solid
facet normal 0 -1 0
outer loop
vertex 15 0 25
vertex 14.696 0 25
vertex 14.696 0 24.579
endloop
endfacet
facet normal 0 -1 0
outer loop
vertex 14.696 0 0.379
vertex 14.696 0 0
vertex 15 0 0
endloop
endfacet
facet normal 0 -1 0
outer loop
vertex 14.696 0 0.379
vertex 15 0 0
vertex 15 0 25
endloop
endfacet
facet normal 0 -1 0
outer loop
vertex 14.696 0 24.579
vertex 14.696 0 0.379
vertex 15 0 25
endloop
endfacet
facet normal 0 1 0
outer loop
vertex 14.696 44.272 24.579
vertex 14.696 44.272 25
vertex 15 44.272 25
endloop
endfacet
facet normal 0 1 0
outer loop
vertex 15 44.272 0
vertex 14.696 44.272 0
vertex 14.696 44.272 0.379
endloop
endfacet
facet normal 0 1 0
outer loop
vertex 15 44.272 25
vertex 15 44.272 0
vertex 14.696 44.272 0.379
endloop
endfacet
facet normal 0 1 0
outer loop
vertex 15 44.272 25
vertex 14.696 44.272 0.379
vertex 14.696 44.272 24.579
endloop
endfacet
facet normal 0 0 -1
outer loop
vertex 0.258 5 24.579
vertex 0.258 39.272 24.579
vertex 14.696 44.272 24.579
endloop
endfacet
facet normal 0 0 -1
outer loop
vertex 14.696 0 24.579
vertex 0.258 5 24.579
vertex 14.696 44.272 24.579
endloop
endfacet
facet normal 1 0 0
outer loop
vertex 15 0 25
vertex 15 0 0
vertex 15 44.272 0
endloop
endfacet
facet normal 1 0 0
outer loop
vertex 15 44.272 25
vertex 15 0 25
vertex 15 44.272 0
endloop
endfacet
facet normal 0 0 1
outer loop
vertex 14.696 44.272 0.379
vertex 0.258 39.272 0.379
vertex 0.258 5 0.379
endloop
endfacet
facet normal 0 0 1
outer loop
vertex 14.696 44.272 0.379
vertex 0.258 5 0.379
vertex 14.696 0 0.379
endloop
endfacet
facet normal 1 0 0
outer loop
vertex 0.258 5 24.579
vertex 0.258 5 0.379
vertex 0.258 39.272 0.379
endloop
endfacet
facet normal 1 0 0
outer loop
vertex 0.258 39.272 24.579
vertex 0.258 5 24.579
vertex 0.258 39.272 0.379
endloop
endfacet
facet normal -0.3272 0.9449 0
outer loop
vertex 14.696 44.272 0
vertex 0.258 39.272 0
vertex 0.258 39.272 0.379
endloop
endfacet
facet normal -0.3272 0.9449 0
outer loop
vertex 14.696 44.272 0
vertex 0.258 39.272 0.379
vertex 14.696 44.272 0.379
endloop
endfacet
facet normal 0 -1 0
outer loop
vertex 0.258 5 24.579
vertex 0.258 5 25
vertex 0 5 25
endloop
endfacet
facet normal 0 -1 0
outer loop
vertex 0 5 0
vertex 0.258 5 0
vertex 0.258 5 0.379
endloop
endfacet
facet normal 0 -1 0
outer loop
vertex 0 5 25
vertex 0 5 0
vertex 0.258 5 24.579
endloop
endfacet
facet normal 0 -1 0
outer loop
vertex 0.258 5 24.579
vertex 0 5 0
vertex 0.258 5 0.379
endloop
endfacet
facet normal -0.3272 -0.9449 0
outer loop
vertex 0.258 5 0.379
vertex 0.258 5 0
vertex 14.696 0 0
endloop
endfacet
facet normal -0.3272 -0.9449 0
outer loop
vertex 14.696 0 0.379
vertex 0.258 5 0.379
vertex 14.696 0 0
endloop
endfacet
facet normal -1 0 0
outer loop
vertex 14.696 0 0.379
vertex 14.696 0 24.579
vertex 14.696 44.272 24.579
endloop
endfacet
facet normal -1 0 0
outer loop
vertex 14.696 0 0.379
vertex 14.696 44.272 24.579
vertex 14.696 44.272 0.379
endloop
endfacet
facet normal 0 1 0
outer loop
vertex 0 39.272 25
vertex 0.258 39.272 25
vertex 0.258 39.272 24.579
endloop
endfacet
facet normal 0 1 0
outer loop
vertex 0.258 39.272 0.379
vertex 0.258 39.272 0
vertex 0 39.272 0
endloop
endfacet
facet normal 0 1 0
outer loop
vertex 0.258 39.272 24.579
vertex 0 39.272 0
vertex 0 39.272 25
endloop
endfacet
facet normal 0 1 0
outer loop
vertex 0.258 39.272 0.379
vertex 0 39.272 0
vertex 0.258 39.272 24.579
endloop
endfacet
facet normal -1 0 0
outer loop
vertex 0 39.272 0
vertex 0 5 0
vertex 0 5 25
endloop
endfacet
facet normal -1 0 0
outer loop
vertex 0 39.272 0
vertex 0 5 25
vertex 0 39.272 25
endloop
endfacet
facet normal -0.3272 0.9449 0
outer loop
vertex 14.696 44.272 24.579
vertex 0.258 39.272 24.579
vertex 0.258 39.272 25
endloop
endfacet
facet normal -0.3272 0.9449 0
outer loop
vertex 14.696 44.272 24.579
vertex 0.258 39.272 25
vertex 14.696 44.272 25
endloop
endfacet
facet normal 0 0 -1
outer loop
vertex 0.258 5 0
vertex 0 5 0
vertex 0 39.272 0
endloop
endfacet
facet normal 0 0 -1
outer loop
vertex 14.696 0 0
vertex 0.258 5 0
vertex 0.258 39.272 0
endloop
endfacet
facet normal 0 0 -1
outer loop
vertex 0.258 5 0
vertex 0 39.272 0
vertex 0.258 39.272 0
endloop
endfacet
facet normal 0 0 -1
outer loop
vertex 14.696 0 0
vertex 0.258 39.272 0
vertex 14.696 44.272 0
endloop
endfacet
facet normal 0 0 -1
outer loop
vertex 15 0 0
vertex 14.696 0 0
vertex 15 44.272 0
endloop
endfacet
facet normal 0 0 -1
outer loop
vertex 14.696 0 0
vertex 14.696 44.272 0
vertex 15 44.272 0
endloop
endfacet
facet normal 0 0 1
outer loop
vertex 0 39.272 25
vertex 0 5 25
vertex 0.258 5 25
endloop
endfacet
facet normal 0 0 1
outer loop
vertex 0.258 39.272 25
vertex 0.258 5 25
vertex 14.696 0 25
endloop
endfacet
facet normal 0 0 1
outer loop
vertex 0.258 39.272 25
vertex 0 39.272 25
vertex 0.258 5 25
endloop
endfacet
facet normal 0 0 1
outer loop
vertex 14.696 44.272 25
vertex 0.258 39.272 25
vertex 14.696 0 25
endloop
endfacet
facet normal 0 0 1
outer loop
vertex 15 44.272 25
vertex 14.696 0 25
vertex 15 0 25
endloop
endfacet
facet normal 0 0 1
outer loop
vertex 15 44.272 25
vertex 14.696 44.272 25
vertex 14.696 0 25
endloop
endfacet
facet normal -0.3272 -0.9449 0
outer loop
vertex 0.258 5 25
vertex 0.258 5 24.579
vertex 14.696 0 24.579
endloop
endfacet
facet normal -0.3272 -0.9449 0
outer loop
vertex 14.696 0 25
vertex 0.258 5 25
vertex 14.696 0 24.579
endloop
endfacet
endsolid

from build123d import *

# Parameters (mm, degrees)
SKETCH1_W           = 15
SKETCH1_H           = 44.271951098
BOSS_EXTRUDE4_DEPTH = 25
SKETCH4_W           = 14.437791502
SKETCH4_H           = 24.200488612
CUT_EXTRUDE4_DEPTH  = 54.009486453
CUT_EXTRUDE5_DEPTH  = 54.009486453
CUT_EXTRUDE6_DEPTH  = 54.009486453
SKETCH7_W           = 0.258481213
SKETCH7_H           = 5
CUT_EXTRUDE7_DEPTH  = 54.009486453
SKETCH10_W          = 0.258481213
SKETCH10_H          = 5
CUT_EXTRUDE8_DEPTH  = 54.009486453


with BuildPart() as part:
    # Sketch1 → Boss-Extrude4 (new body)
    with BuildSketch(Plane.XY):
        with Locations((7.5, 22.135975549)):
            Rectangle(SKETCH1_W, SKETCH1_H)
    extrude(amount=BOSS_EXTRUDE4_DEPTH)

    # Sketch4 → Cut-Extrude4 (cut, through all)
    with BuildSketch(Plane(origin=(0, 44.271951098, 0), x_dir=(1, 0, 0), z_dir=(0, 1, 0))):
        with Locations((7.477376964, -12.479096566)):
            Rectangle(SKETCH4_W, SKETCH4_H)
    extrude(amount=-CUT_EXTRUDE4_DEPTH, mode=Mode.SUBTRACT)

    # Sketch5 → Cut-Extrude5 (cut, through all)
    with BuildSketch(Plane(origin=(0, 0, 0), x_dir=(-1, 0, 0), z_dir=(0, 0, -1))):
        Polygon((-14.696272715, 44.271951098), (-0.258481213, 44.271951098), (-0.258481213, 39.271951098), align=None)
    extrude(amount=-CUT_EXTRUDE5_DEPTH, mode=Mode.SUBTRACT)

    # Sketch6 → Cut-Extrude6 (cut, through all)
    with BuildSketch(Plane(origin=(0, 0, 0), x_dir=(-1, 0, 0), z_dir=(0, 0, -1))):
        Polygon((-0.258481213, 0), (-0.258481213, 5), (-14.696272715, 0), align=None)
    extrude(amount=-CUT_EXTRUDE6_DEPTH, mode=Mode.SUBTRACT)

    # Sketch7 → Cut-Extrude7 (cut, through all)
    with BuildSketch(Plane(origin=(0, 0, 0), x_dir=(-1, 0, 0), z_dir=(0, 0, -1))):
        with Locations((-0.129240607, 41.771951098)):
            Rectangle(SKETCH7_W, SKETCH7_H)
    extrude(amount=-CUT_EXTRUDE7_DEPTH, mode=Mode.SUBTRACT)

    # Sketch10 → Cut-Extrude8 (cut, through all)
    with BuildSketch(Plane(origin=(0, 0, 0), x_dir=(-1, 0, 0), z_dir=(0, 0, -1))):
        with Locations((-0.129240607, 2.5)):
            Rectangle(SKETCH10_W, SKETCH10_H)
    extrude(amount=-CUT_EXTRUDE8_DEPTH, mode=Mode.SUBTRACT)


solid = part.part
